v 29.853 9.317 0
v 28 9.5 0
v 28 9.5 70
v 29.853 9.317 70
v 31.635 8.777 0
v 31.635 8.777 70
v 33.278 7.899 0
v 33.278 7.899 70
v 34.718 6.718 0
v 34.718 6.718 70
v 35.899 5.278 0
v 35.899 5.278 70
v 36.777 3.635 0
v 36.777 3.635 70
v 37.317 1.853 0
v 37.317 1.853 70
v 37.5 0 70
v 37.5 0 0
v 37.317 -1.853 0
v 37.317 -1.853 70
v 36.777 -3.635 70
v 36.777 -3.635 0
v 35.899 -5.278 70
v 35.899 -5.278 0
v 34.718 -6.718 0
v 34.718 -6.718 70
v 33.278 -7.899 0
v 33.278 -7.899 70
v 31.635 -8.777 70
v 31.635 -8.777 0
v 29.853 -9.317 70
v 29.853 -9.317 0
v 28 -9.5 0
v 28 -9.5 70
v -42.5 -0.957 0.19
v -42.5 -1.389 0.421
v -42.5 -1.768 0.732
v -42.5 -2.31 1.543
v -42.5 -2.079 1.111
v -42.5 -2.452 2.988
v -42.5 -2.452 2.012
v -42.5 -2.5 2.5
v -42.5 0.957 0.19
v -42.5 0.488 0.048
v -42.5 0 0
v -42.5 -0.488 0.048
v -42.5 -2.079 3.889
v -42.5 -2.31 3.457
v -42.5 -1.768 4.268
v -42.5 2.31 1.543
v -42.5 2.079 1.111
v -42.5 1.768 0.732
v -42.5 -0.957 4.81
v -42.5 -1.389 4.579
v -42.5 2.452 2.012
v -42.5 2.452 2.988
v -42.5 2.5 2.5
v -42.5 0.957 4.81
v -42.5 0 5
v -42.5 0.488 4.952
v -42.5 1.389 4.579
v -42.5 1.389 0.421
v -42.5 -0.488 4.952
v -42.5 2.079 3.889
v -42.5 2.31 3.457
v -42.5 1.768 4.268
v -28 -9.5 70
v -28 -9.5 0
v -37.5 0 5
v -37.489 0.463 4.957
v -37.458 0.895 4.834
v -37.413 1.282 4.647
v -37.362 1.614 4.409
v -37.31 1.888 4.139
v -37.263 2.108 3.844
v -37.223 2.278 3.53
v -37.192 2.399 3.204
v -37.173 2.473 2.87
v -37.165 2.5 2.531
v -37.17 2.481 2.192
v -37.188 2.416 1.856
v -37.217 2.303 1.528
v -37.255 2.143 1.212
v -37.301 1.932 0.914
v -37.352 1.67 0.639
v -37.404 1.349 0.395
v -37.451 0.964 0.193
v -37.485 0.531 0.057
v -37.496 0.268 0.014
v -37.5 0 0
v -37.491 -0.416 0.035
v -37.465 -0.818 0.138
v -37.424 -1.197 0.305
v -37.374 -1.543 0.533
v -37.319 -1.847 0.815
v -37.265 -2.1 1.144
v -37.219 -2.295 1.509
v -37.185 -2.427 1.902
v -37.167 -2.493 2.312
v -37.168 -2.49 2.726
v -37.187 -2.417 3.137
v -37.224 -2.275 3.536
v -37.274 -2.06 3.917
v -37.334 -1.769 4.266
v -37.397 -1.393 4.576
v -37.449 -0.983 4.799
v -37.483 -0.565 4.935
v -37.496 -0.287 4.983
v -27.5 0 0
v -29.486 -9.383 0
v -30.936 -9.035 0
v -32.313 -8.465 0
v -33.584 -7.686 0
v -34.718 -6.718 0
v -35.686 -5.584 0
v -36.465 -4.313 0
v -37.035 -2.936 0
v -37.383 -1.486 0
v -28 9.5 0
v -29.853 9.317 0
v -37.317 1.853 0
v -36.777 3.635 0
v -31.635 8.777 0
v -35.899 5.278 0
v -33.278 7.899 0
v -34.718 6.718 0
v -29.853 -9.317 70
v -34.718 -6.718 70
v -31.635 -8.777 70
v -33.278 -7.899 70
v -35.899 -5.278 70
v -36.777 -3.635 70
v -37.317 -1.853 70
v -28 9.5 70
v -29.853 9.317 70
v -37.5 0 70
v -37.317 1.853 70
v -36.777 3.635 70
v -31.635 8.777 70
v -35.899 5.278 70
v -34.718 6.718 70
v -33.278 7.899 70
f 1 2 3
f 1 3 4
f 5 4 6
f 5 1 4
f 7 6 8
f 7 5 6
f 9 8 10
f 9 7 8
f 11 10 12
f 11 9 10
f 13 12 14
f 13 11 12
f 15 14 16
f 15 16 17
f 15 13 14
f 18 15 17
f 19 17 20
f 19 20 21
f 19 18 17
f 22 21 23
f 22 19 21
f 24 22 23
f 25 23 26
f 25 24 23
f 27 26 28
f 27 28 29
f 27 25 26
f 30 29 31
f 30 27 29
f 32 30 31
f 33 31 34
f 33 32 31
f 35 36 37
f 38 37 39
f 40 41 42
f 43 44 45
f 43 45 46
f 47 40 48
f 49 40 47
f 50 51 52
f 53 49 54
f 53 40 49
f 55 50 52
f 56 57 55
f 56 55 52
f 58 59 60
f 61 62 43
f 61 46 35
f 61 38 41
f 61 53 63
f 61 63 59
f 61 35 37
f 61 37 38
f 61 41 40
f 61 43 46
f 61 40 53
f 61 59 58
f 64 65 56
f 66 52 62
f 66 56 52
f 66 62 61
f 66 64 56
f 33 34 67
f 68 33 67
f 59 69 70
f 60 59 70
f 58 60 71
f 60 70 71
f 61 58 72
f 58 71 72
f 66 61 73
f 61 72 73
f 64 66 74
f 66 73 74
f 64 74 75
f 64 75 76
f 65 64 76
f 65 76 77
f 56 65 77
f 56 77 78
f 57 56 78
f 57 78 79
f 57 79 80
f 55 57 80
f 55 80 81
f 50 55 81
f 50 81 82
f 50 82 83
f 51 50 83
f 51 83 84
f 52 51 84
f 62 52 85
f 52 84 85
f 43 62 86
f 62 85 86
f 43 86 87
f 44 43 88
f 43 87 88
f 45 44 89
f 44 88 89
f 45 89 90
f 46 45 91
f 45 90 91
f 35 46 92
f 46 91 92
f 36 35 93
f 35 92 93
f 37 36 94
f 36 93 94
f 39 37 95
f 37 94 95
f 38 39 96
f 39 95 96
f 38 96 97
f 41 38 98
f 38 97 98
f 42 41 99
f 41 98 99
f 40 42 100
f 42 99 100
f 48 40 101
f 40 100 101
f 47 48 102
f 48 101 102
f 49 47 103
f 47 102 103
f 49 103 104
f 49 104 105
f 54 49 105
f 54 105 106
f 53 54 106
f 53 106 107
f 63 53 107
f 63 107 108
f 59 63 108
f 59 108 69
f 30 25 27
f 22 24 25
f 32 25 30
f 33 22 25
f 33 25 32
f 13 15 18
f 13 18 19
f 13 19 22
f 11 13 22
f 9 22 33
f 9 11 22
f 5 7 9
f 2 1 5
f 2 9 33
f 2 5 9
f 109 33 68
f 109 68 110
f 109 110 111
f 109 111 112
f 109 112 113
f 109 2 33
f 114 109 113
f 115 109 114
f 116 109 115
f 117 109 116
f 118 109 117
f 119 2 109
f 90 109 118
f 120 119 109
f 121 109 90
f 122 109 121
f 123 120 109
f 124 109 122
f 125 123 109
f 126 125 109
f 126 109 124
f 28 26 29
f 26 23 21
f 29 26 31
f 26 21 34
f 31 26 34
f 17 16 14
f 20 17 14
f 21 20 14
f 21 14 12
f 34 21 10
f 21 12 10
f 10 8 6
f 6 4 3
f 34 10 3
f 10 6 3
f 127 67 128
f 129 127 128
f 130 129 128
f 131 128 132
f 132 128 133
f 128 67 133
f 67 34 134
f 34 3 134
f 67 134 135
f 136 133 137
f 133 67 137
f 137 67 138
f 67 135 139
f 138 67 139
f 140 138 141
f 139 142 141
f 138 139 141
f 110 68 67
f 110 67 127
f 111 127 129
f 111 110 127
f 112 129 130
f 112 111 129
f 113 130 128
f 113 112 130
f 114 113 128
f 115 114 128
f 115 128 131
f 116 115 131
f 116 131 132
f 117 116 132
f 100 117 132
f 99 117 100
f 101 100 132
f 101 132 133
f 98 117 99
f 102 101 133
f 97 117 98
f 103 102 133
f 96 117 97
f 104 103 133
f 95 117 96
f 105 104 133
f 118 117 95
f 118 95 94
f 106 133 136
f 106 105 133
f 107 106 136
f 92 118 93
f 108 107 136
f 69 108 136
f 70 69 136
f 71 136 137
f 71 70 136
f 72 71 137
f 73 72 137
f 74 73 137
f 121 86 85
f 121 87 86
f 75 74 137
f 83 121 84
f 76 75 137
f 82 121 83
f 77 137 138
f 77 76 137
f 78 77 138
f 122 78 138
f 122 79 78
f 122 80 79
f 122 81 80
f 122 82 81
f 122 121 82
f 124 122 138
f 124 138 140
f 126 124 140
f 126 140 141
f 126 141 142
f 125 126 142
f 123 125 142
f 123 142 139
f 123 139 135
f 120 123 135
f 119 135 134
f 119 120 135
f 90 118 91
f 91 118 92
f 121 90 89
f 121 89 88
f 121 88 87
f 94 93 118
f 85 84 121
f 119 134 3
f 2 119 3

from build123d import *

# Parameters (mm, degrees)
EXTRUDE_1_DEPTH      = 70
EXTRUDE_3_DEPTH      = 5
EXTRUDE_3_DEPTH_BACK = 10
SKETCH_2_R           = 2.5


with BuildPart() as part:
    # 草图1 → 凸台-拉伸1 (new body)
    with BuildSketch(Plane.XY):
        with BuildLine():
            Line((-28, 9.5), (28, 9.5))
            ThreePointArc((28, 9.5), (37.5, 0), (28, -9.5))
            Line((28, -9.5), (-28, -9.5))
            ThreePointArc((-28, -9.5), (-37.5, 0), (-28, 9.5))
        make_face()
    extrude(amount=EXTRUDE_1_DEPTH)

    # 草图2 → 凸台-拉伸3 (add, two sides: drawn at the far end of the back side and taken through both)
    with BuildSketch(Plane.ZY.offset(37.5).offset(-EXTRUDE_3_DEPTH_BACK)):
        with Locations((2.5, 0)):
            Circle(SKETCH_2_R)
    extrude(amount=EXTRUDE_3_DEPTH + EXTRUDE_3_DEPTH_BACK)


solid = part.part
